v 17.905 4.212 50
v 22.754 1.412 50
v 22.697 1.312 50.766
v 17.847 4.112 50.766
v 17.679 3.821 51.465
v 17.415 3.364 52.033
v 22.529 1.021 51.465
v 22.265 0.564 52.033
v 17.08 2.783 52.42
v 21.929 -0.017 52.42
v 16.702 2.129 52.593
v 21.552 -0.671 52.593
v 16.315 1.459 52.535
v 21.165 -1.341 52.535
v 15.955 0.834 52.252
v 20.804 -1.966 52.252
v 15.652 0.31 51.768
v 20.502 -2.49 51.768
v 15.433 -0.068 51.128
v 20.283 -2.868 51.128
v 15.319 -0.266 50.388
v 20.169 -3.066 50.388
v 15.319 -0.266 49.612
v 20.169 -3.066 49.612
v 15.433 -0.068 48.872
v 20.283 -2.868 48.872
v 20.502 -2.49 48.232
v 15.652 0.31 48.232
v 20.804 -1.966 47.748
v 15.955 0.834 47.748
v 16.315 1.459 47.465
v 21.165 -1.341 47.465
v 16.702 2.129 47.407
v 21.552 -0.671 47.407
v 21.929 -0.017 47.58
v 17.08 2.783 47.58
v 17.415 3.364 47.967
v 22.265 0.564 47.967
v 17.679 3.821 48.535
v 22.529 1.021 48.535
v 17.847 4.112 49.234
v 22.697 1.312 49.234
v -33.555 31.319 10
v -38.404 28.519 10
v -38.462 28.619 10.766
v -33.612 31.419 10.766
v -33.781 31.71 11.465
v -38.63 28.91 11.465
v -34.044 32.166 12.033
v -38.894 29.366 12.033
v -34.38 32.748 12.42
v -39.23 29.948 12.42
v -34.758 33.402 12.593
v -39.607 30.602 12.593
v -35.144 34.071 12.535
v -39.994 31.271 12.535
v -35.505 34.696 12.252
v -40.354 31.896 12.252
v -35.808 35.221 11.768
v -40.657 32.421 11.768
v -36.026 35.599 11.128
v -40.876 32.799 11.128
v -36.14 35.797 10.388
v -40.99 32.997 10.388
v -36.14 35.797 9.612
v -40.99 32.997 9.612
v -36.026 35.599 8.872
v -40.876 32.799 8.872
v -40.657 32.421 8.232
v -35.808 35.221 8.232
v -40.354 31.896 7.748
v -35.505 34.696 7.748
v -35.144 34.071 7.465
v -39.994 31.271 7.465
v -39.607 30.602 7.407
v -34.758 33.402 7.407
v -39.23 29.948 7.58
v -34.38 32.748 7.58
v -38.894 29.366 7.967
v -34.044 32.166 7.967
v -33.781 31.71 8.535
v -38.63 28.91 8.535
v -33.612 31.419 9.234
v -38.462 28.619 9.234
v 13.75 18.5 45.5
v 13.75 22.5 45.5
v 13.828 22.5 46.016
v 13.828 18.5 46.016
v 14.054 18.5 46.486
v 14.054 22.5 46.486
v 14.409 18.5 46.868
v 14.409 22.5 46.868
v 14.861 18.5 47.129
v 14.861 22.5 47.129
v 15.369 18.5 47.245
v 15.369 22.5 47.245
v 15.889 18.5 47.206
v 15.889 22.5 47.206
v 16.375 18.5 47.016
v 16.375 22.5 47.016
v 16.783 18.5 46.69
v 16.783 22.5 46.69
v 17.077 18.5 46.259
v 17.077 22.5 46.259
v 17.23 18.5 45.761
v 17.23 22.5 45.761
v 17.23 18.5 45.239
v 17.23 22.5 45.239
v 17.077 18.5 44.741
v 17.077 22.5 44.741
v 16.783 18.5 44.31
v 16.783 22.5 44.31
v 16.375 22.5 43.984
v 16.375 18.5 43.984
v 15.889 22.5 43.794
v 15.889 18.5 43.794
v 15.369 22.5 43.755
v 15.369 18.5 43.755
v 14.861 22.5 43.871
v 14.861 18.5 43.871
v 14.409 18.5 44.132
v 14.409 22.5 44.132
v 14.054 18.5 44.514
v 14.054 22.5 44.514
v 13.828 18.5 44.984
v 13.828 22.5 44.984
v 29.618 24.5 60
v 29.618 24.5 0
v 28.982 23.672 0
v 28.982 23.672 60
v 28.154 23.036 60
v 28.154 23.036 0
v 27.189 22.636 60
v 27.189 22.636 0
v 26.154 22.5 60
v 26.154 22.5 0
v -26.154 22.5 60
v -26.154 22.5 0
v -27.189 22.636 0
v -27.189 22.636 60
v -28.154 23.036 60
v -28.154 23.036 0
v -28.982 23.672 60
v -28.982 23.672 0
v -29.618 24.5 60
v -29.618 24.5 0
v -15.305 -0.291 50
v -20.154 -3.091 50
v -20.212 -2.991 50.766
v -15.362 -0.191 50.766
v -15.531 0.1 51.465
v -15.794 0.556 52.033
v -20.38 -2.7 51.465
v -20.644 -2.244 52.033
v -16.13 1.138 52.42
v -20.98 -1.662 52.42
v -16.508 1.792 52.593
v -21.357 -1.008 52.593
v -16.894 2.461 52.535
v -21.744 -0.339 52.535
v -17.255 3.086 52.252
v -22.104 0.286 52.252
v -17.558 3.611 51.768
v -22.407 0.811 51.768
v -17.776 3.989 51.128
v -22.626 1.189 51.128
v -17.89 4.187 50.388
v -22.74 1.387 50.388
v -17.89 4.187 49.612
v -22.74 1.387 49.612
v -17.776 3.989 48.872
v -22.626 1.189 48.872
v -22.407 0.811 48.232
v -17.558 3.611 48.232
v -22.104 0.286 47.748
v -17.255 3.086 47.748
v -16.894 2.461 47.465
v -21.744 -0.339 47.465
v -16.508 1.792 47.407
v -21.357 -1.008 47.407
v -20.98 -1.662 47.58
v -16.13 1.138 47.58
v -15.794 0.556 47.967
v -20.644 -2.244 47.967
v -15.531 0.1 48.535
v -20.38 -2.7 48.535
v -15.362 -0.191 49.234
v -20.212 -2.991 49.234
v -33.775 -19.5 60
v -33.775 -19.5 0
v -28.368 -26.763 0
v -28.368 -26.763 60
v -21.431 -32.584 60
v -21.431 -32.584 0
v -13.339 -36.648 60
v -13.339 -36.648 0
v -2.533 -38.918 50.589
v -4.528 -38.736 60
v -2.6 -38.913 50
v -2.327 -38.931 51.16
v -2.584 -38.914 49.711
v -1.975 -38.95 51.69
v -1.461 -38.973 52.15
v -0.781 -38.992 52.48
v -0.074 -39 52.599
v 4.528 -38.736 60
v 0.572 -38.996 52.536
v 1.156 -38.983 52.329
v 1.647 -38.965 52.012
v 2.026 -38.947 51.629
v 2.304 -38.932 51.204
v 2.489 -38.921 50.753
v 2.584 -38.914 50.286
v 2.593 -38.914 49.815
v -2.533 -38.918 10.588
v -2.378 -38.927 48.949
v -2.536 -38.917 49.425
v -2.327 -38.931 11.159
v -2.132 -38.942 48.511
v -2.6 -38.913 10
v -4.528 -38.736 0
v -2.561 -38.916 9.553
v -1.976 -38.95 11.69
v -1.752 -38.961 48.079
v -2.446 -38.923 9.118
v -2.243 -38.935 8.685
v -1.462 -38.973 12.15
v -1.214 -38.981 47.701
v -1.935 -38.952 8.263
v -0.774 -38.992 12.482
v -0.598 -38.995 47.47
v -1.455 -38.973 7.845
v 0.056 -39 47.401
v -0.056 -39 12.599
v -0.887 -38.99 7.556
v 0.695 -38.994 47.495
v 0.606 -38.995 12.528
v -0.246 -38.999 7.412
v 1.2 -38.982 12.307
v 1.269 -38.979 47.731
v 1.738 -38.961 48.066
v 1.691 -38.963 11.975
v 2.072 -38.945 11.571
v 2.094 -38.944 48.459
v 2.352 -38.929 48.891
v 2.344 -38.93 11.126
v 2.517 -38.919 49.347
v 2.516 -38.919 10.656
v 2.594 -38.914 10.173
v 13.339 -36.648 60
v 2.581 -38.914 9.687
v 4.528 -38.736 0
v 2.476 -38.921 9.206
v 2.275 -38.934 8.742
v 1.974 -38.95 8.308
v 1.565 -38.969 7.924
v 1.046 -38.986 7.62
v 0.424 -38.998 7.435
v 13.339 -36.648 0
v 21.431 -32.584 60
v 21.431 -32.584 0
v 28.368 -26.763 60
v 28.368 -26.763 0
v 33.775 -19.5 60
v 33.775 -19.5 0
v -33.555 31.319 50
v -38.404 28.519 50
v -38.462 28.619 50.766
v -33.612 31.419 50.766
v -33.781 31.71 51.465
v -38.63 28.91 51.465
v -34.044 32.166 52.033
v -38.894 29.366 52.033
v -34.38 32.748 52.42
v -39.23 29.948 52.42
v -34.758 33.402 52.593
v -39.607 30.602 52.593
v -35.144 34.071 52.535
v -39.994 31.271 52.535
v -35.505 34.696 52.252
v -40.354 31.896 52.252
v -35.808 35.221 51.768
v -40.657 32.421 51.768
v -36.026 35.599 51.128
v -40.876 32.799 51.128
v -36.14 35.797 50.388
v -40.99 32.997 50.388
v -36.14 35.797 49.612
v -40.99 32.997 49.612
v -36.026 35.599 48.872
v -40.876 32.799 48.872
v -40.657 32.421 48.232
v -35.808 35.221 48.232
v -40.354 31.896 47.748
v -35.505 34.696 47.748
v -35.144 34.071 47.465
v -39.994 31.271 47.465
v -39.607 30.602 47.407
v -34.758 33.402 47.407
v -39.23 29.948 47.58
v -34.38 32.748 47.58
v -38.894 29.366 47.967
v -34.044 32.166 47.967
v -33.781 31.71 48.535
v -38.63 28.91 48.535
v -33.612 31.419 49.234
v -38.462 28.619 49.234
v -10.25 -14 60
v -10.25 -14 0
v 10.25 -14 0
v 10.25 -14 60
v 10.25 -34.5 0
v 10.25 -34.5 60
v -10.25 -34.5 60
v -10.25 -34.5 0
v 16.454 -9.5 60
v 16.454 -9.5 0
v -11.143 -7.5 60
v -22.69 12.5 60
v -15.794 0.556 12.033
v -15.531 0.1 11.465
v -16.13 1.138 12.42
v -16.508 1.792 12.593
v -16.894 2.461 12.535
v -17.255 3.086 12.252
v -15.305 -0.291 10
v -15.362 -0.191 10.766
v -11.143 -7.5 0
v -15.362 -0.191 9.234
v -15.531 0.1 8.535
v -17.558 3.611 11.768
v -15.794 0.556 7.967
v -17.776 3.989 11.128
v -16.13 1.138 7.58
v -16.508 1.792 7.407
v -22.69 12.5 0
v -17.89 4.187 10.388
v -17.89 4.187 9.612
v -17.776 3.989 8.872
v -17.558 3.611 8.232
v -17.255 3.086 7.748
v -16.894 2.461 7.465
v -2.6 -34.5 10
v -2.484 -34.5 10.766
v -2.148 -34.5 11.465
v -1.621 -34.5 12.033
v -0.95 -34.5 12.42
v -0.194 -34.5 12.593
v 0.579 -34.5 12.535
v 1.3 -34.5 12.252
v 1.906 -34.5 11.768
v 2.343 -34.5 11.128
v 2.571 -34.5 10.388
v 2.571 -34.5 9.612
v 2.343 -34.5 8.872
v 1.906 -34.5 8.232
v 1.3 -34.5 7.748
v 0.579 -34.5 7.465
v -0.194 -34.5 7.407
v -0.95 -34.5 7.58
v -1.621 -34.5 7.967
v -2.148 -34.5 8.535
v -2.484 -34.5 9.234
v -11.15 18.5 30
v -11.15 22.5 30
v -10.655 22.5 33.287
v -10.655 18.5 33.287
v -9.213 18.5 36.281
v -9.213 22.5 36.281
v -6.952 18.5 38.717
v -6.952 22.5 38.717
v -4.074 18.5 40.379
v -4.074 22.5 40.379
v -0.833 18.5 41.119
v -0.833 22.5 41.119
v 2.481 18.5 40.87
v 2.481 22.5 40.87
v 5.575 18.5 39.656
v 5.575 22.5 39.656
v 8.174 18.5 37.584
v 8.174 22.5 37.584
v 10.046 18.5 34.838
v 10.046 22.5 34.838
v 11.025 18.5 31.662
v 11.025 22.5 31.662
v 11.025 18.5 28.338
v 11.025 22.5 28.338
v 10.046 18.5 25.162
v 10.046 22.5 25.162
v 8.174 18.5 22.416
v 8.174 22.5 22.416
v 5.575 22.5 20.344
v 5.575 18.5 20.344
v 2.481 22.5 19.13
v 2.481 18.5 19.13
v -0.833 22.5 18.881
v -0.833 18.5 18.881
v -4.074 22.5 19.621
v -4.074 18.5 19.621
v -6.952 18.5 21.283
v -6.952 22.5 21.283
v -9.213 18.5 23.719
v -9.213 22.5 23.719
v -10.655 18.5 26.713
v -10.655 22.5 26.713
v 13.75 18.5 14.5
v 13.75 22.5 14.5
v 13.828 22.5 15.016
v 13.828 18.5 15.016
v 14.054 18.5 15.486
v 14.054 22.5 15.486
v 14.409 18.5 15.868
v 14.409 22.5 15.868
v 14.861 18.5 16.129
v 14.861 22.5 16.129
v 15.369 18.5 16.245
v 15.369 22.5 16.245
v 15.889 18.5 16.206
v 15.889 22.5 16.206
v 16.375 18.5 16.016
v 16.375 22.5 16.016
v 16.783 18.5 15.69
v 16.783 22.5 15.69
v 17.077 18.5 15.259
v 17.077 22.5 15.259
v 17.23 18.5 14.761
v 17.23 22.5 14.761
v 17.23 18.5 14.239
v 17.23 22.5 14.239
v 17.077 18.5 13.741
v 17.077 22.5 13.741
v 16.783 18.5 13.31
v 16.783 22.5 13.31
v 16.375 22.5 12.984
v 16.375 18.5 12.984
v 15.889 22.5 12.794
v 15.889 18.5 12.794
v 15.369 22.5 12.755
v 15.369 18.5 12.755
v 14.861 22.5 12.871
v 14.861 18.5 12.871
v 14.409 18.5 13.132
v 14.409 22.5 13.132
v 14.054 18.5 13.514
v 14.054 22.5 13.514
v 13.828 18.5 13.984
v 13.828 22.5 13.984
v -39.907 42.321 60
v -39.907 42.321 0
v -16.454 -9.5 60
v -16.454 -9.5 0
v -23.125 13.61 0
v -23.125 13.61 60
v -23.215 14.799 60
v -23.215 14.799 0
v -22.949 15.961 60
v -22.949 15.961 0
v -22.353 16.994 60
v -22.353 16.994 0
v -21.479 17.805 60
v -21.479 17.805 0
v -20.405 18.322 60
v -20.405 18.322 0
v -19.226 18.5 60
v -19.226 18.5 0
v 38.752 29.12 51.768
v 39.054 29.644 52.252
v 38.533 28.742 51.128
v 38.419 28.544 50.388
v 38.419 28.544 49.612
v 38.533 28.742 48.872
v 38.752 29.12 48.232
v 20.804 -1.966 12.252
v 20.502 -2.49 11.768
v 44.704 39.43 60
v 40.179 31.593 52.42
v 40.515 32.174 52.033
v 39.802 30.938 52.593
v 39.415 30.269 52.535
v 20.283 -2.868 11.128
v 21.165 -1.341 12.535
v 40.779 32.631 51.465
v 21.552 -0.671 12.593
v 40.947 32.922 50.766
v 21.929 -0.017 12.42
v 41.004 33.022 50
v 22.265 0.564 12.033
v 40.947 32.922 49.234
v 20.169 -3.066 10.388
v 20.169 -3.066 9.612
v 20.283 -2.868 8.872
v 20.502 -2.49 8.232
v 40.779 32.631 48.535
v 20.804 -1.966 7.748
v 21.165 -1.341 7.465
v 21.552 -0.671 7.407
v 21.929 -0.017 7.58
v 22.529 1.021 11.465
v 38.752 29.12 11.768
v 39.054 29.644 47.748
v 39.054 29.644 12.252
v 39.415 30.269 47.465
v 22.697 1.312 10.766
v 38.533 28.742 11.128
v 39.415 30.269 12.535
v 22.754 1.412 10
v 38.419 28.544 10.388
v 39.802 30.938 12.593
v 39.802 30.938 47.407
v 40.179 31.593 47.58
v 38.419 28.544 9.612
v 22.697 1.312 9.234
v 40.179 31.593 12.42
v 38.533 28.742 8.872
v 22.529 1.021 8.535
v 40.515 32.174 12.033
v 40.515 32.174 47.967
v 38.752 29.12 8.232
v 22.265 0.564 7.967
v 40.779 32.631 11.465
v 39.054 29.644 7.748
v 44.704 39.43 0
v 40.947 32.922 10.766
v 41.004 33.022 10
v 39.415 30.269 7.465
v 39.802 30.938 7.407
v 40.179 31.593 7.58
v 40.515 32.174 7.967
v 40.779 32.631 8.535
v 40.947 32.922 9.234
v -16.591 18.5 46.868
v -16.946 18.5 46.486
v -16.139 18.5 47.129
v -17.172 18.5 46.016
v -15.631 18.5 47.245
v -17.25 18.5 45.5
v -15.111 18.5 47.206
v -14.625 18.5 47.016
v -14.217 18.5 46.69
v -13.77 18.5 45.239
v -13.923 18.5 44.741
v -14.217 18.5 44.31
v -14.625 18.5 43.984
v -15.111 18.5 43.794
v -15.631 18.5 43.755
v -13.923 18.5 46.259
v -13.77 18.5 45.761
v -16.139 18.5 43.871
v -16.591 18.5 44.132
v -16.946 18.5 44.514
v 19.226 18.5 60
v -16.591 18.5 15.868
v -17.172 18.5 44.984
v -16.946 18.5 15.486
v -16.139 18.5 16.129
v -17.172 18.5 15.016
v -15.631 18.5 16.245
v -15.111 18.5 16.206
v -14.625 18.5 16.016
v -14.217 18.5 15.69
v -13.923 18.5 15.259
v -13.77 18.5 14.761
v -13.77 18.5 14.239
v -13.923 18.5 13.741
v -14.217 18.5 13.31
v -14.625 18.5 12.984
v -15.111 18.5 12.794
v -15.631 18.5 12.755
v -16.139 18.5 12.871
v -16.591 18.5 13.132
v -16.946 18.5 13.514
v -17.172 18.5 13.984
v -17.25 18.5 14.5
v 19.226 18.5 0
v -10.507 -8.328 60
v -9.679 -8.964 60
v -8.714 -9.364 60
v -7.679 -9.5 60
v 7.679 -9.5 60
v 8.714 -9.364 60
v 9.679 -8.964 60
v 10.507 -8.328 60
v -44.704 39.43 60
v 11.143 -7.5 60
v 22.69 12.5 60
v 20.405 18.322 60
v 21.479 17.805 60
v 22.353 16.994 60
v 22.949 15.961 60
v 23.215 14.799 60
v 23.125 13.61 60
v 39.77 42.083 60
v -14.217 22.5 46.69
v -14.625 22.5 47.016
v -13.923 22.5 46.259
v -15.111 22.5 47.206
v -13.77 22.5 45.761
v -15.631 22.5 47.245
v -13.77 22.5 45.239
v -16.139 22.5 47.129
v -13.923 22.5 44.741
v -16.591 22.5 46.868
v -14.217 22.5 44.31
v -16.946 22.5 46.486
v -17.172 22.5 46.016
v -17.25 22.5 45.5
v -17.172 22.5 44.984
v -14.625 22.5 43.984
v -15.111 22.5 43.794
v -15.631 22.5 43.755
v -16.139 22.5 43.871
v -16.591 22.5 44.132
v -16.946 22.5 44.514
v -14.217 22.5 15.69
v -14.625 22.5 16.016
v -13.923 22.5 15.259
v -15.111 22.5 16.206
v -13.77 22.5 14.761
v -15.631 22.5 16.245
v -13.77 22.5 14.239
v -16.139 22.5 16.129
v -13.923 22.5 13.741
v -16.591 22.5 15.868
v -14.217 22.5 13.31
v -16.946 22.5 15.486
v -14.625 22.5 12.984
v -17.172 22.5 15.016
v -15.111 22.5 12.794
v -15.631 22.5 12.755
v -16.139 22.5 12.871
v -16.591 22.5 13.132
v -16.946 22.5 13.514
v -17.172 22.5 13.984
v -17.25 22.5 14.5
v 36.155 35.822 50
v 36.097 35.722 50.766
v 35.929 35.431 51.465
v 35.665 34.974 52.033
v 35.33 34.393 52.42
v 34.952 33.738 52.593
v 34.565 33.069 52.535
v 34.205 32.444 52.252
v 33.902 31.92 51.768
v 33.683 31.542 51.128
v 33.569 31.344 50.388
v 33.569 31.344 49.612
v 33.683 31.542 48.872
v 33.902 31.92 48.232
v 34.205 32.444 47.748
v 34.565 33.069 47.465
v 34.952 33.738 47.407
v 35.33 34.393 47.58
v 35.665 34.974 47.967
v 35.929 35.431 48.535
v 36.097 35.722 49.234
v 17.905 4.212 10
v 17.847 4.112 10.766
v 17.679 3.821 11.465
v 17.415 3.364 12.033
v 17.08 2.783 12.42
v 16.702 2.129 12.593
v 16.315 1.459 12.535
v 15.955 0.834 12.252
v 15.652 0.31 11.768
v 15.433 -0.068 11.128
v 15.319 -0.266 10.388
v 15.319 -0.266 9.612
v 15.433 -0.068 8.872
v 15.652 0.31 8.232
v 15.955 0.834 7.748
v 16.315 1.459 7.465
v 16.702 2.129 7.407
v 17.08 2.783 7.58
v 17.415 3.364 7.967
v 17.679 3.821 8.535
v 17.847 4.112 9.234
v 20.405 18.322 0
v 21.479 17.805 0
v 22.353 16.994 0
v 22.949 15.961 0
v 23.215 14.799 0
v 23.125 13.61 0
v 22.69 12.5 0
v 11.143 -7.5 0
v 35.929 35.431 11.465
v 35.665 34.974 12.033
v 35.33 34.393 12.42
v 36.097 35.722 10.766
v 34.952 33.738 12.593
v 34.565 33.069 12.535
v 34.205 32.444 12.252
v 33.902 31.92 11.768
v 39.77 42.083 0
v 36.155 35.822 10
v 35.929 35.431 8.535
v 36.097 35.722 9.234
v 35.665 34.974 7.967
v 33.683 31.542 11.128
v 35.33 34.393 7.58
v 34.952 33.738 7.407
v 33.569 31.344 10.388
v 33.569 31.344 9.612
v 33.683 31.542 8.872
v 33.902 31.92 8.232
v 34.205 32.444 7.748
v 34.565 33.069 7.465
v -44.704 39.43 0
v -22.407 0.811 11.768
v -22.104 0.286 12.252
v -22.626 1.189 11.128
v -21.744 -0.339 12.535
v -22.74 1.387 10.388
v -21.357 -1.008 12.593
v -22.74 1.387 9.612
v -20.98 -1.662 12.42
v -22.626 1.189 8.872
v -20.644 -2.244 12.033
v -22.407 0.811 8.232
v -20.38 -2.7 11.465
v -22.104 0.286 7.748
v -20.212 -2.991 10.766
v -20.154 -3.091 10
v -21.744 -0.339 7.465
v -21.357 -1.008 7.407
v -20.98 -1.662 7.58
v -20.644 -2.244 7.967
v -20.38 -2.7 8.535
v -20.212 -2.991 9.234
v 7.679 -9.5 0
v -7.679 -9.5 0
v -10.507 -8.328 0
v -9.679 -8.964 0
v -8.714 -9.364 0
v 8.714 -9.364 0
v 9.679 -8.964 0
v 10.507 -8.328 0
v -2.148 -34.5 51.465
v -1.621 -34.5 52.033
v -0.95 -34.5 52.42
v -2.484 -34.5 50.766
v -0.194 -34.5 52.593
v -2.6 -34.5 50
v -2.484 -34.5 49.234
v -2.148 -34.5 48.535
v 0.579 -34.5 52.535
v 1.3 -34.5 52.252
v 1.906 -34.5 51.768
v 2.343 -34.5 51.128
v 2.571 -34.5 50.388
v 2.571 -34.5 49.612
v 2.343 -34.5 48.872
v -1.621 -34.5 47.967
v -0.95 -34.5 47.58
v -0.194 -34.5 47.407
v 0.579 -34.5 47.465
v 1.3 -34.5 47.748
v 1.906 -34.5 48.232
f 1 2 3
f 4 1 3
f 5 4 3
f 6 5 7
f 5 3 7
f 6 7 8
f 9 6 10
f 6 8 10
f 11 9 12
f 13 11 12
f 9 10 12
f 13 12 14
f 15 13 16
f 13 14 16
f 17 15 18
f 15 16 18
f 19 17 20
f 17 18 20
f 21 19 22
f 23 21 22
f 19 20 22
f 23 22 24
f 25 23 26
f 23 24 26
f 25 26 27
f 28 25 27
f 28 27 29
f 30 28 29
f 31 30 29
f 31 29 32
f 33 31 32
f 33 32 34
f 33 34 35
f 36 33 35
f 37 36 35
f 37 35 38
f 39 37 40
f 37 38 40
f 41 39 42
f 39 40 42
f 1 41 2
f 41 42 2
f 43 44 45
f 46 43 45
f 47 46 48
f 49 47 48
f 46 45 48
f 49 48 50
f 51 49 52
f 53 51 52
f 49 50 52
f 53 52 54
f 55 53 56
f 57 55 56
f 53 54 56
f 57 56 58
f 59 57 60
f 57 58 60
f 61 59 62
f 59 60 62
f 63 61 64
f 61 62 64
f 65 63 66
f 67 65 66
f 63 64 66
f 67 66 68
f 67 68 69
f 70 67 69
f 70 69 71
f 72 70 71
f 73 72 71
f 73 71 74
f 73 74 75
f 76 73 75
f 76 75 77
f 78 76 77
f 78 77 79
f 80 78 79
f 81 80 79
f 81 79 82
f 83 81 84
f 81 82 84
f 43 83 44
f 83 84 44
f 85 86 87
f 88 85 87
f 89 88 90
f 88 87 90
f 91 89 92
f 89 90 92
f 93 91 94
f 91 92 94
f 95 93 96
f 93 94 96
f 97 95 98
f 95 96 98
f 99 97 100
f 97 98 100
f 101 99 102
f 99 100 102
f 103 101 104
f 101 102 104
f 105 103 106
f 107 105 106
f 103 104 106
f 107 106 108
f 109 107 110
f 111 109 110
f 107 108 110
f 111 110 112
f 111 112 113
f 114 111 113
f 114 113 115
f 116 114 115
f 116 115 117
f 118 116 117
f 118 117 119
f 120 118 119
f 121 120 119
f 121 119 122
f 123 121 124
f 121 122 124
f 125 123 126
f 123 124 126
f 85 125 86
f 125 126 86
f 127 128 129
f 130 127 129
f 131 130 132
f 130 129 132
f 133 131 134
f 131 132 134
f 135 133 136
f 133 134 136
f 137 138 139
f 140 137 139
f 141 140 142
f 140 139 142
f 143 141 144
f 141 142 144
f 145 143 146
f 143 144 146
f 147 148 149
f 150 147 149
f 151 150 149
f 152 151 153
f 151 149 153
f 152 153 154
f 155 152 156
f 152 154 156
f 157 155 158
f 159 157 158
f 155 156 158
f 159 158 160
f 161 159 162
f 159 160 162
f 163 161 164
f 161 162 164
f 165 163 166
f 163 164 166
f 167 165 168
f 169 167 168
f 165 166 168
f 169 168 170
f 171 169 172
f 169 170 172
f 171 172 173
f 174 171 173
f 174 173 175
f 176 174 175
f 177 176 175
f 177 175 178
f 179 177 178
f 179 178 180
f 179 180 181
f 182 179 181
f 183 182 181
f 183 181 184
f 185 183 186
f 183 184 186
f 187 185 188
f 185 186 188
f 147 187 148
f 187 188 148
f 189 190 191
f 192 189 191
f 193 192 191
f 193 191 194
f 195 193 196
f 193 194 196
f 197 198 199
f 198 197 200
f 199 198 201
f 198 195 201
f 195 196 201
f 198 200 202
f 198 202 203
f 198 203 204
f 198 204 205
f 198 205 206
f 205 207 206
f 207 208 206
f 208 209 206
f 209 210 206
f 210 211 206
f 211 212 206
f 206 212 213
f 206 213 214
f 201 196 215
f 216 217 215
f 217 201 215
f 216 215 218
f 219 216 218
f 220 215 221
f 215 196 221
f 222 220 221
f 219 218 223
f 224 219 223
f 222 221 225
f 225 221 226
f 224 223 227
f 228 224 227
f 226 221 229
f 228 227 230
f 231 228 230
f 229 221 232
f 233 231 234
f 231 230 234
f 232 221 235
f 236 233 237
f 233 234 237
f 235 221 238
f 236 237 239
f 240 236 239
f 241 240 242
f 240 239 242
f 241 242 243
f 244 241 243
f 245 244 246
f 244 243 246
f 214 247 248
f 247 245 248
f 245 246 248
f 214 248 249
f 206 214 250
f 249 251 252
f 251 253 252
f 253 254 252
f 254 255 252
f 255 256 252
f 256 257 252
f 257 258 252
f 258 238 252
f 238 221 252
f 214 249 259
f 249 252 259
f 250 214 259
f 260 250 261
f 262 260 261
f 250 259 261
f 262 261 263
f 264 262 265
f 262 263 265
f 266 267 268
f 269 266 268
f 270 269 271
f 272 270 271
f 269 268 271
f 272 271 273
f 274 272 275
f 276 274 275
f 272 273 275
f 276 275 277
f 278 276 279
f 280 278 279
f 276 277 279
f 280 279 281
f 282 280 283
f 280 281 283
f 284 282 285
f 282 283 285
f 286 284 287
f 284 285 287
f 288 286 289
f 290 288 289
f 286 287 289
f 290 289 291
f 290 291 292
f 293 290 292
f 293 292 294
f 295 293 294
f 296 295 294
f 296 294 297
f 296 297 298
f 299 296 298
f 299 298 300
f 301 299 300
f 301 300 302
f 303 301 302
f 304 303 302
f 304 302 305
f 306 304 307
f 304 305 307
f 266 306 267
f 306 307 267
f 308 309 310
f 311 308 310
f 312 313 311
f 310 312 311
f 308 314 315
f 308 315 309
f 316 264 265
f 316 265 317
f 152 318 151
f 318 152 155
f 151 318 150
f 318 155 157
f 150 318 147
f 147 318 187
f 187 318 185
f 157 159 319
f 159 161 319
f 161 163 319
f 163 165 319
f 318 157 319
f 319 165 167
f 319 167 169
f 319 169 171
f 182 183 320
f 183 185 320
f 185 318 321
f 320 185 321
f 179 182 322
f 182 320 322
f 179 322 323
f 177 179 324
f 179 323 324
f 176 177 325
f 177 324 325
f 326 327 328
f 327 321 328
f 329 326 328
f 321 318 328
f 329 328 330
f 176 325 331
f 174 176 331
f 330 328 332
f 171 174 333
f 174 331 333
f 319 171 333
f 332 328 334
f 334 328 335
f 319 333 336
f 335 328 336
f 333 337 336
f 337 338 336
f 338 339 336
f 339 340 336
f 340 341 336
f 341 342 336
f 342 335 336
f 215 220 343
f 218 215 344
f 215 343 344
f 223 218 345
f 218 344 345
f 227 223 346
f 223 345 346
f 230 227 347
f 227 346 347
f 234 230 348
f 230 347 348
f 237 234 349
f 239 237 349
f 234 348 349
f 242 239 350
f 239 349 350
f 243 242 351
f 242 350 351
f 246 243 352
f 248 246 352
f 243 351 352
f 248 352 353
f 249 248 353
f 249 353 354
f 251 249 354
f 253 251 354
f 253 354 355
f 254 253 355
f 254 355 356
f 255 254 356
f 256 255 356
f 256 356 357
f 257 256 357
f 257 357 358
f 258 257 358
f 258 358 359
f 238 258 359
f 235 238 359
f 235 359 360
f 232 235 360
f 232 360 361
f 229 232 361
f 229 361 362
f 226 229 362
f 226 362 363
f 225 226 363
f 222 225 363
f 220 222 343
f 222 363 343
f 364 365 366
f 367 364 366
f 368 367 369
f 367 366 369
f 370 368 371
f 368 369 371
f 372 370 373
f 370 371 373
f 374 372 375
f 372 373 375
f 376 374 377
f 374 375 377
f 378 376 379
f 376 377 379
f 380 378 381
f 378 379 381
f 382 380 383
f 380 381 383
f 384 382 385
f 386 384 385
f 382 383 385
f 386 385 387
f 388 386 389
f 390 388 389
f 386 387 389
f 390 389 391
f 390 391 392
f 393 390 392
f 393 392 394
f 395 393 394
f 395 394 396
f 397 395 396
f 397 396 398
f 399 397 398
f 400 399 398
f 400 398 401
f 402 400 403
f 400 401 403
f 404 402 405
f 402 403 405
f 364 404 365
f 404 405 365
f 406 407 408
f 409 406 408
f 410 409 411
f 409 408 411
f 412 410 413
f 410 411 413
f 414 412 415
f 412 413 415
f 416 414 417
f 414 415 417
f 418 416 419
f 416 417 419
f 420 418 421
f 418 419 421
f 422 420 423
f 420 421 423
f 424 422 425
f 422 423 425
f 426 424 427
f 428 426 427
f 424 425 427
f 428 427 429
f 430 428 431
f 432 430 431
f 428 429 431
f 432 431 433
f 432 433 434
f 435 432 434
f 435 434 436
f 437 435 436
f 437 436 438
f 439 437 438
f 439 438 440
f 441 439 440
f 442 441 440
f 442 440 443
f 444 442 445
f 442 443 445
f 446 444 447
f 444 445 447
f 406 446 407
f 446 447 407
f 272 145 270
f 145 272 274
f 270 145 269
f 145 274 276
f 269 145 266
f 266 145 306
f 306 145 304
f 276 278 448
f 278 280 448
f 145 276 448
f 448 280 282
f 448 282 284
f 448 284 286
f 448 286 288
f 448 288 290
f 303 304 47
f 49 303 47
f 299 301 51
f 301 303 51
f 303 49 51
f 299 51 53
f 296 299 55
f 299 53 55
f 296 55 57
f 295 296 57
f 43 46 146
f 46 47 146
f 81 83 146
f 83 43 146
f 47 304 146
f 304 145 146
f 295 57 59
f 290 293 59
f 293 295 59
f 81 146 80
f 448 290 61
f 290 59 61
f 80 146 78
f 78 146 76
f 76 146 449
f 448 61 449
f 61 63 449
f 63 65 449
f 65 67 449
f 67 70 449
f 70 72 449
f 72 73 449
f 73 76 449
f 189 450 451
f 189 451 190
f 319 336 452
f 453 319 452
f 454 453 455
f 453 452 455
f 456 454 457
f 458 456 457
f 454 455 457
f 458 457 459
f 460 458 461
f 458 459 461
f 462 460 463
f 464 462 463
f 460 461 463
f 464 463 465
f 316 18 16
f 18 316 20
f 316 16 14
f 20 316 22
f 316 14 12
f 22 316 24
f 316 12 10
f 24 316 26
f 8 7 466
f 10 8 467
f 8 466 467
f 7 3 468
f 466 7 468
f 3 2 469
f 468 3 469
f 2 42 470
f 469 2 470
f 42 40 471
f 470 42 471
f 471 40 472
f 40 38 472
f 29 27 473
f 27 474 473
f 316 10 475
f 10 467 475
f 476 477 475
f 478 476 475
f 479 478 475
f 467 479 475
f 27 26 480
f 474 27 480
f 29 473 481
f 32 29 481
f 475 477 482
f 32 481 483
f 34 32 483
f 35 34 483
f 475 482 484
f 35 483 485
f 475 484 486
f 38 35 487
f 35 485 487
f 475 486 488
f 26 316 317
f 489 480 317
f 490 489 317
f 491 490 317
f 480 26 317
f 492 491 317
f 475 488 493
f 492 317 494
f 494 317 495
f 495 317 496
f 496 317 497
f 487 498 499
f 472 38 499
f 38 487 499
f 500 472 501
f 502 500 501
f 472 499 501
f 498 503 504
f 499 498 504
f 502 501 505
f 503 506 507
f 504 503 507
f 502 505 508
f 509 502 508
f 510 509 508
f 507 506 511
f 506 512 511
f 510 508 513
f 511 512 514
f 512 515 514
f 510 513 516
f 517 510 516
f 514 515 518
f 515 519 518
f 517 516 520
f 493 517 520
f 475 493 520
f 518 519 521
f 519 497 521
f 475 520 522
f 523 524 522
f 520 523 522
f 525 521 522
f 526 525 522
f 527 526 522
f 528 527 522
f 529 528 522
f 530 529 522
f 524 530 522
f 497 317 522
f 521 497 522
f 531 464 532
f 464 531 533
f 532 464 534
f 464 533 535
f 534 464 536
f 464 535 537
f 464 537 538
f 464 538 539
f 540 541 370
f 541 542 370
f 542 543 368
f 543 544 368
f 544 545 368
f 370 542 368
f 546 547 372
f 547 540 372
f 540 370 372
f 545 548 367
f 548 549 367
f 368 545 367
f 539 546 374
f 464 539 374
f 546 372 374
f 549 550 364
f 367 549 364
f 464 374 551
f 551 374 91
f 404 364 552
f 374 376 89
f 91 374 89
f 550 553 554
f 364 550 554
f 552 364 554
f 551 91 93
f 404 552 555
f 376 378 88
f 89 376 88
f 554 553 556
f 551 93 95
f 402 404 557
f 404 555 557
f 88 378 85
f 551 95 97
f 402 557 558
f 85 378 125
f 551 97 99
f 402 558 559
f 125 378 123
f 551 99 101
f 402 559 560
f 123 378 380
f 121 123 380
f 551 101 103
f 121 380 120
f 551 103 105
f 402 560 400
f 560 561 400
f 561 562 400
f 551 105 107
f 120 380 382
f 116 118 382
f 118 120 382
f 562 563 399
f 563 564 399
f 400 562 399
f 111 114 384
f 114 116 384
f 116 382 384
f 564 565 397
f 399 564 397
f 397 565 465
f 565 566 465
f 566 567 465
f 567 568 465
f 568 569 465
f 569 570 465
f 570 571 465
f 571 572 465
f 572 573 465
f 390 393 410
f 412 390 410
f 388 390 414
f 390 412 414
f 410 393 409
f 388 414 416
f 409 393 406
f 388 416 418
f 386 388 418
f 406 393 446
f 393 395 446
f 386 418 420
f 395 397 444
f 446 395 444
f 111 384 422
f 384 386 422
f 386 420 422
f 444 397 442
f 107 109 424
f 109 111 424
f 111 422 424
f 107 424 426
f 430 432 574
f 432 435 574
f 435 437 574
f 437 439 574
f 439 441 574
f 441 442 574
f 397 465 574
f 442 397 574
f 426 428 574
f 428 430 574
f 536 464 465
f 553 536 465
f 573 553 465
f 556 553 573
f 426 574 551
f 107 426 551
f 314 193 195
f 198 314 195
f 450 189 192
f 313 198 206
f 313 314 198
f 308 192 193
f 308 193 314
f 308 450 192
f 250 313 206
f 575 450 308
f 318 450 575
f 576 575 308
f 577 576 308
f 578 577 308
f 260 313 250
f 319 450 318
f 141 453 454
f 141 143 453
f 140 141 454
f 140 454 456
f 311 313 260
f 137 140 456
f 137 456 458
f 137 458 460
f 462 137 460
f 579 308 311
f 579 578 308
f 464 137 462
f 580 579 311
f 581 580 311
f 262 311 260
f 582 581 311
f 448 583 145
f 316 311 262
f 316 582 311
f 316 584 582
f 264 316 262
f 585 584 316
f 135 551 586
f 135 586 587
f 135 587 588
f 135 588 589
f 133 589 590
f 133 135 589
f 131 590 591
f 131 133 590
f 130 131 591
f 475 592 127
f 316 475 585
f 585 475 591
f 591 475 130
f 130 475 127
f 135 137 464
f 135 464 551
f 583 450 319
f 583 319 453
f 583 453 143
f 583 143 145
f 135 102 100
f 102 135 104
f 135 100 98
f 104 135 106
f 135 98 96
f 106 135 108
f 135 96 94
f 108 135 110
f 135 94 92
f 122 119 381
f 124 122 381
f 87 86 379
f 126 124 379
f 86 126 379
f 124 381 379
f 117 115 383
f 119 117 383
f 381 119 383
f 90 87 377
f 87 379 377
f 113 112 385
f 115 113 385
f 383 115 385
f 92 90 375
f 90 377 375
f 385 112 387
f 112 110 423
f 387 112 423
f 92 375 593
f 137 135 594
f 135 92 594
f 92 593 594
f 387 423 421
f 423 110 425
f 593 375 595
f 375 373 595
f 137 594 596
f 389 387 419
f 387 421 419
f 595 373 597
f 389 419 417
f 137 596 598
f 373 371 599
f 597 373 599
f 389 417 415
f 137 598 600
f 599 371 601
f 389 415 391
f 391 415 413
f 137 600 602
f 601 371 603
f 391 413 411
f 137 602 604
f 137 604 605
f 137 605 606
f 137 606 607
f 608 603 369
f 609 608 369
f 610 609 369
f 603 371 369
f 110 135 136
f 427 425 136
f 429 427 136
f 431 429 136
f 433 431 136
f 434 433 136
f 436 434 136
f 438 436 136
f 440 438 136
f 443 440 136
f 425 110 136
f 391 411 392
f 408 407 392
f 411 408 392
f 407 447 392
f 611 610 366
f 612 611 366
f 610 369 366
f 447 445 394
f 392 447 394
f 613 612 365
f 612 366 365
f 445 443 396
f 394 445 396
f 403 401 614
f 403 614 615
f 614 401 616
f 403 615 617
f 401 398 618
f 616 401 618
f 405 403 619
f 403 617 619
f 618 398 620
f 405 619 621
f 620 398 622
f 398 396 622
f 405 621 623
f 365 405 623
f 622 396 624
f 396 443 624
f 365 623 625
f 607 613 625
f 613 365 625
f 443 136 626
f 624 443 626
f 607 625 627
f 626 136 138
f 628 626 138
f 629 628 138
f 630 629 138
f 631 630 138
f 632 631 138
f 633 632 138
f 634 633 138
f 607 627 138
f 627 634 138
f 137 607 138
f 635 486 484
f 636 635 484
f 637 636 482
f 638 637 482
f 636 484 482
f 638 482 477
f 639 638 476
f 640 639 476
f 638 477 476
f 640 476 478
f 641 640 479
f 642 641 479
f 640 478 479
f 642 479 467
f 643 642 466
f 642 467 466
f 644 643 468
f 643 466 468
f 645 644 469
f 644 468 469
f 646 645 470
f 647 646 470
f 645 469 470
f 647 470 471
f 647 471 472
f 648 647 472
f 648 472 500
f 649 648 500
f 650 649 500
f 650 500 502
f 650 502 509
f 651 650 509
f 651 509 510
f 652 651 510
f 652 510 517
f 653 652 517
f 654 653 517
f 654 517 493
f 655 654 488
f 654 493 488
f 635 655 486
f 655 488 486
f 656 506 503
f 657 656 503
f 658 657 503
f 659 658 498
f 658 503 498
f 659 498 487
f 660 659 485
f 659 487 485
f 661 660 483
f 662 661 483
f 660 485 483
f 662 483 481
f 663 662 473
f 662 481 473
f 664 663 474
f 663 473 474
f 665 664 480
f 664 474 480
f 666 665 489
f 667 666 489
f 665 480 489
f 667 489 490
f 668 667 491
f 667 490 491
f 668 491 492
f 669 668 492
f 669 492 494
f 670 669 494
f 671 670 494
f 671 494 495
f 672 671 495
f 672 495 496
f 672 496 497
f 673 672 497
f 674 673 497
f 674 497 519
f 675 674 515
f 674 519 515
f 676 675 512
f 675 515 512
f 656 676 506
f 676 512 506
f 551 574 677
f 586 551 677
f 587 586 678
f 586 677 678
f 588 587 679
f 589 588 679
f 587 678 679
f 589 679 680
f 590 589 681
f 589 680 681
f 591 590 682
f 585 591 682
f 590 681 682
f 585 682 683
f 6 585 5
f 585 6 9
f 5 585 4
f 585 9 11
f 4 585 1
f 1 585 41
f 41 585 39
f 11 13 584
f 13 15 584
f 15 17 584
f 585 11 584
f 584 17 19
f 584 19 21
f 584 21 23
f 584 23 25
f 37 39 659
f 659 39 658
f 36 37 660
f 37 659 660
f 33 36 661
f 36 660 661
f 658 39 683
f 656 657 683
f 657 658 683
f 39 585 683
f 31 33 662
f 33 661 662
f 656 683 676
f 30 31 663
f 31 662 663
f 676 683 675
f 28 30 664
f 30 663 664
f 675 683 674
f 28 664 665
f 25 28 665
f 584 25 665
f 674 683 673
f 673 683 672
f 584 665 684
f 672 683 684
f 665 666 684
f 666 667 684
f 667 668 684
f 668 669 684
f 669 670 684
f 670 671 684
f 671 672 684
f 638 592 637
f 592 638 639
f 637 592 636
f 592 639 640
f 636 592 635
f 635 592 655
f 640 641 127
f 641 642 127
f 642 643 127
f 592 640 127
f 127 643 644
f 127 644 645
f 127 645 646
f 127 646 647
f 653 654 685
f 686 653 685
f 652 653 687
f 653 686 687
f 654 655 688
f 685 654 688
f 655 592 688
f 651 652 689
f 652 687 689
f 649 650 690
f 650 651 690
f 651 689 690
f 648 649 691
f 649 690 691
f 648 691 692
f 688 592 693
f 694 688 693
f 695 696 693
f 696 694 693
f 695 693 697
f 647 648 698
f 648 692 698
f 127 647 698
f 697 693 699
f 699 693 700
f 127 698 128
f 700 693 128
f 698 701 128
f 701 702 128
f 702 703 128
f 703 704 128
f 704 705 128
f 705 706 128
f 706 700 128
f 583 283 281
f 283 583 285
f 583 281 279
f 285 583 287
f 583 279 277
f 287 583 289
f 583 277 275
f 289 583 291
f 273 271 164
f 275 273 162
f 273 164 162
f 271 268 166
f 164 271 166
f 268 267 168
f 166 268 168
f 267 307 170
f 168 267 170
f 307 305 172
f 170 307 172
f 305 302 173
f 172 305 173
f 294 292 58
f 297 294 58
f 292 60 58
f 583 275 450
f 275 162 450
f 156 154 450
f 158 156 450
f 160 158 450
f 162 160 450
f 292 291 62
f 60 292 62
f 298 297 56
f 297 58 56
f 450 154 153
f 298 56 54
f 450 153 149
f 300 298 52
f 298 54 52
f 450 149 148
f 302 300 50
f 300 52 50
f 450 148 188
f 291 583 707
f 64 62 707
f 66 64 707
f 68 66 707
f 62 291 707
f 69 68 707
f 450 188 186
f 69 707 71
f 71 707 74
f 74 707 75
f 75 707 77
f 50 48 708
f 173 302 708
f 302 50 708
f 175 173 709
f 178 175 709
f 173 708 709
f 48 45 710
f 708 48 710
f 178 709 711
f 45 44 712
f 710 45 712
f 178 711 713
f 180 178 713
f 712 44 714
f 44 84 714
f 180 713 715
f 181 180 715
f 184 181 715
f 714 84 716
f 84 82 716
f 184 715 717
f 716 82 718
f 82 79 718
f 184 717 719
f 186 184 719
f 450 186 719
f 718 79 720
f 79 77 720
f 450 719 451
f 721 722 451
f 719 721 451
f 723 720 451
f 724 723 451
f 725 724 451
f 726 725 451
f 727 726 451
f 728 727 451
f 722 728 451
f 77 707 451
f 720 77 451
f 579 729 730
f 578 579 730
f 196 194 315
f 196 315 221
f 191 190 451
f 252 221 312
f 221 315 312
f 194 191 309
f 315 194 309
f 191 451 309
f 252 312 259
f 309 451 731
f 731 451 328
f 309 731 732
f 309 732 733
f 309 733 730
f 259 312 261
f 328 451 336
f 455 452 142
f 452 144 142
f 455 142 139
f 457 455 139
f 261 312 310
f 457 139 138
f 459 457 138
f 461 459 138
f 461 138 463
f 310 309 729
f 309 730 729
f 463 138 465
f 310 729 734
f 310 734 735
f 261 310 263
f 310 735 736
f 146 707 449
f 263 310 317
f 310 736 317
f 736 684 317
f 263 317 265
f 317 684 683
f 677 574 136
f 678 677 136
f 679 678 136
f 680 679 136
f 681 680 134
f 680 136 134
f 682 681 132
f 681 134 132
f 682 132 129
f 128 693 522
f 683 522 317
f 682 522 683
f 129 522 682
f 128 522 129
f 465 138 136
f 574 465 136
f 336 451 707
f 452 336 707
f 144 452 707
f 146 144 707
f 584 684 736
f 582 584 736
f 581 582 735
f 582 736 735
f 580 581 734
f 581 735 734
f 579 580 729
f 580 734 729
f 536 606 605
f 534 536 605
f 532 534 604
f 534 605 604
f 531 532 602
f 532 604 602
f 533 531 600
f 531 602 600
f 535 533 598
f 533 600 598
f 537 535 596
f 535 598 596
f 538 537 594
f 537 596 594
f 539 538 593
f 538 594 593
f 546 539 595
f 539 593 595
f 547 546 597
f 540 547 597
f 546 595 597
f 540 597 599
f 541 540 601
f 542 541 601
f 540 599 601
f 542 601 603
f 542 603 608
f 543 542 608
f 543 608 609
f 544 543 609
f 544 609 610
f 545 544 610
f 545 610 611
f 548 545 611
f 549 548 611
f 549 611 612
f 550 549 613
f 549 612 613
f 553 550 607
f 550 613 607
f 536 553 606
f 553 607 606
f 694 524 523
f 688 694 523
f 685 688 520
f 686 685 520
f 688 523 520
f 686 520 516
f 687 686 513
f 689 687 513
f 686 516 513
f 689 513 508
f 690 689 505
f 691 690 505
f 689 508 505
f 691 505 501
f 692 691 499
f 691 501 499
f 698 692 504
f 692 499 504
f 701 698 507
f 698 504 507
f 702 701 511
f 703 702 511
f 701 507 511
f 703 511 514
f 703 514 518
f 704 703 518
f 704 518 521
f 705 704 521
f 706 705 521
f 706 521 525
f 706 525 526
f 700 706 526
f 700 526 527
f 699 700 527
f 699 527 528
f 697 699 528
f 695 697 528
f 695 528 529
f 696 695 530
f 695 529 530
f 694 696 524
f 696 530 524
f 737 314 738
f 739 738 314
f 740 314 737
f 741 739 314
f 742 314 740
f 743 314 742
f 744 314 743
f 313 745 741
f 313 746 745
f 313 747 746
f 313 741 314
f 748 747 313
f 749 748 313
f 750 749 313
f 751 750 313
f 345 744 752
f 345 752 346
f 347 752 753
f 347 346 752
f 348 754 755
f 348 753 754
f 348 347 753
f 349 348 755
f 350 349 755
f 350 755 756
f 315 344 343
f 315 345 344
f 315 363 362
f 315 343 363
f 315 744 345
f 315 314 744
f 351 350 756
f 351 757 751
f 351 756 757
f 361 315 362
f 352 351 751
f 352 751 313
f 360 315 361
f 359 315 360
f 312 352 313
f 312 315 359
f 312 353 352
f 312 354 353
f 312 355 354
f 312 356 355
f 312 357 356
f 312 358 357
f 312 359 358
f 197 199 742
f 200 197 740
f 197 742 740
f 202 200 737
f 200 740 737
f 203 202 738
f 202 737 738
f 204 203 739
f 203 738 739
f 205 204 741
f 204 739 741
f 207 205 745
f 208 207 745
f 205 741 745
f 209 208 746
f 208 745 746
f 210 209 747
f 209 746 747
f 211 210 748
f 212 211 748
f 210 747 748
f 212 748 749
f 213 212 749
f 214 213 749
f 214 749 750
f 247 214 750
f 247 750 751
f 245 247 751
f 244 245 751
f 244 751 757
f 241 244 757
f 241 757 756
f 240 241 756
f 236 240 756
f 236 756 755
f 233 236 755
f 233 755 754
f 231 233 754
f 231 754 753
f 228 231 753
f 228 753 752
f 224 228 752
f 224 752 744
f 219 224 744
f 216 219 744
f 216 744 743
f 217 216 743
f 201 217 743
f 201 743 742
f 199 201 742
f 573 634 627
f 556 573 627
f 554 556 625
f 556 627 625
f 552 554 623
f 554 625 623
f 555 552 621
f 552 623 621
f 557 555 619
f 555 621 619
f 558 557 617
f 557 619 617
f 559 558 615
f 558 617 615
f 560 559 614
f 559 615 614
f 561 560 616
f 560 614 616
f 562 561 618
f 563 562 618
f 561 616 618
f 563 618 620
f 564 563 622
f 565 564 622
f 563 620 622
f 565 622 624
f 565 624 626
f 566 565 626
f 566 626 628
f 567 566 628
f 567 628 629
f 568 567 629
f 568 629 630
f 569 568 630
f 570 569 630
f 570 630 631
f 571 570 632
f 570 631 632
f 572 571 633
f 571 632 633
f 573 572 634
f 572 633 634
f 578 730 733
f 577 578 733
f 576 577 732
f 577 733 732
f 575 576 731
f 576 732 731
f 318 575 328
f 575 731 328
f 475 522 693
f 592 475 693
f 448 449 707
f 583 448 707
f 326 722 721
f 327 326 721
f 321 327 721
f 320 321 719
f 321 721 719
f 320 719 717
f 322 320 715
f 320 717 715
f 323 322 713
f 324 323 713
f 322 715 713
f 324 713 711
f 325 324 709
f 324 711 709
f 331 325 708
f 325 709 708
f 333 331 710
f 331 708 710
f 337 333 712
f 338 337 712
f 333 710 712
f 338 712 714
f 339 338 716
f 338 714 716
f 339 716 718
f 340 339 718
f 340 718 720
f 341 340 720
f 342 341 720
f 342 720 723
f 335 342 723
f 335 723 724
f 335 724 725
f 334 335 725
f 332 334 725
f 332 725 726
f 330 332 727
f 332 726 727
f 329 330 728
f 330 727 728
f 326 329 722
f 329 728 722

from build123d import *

# Parameters (mm, degrees)
F0_W     = 20.5
F0_H     = 20.5
F1_DEPTH = 60
F2_R     = 1.75
F2_R_2   = 11.15
F3_DEPTH = 4
F4_R     = 2.6
F5_DEPTH = 5.6
F6_R     = 2.6
F7_DEPTH = 5.6
F8_R     = 2.6
F9_DEPTH = 4.501


with BuildPart() as f1:
    # F0 (on Top) → F1 (new body)
    with BuildSketch(Plane.XY):
        with BuildLine():
            Line((-16.4544826719, -9.5), (-33.7749907476, -19.5))
            ThreePointArc((-33.7749907476, -19.5), (0, -39), (33.7749907476, -19.5))
            Line((33.7749907476, -19.5), (16.4544826719, -9.5))
            Line((16.4544826719, -9.5), (44.7044826719, 39.4304353138))
            Line((44.7044826719, 39.4304353138), (39.7695460128, 42.0828742882))
            Line((39.7695460128, 42.0828742882), (29.6180688094, 24.5))
            ThreePointArc((29.6180688094, 24.5), (28.1539671943, 23.0358983849), (26.1539671943, 22.5))
            Line((26.1539671943, 22.5), (-26.1539671943, 22.5))
            ThreePointArc((-26.1539671943, 22.5), (-28.1539671943, 23.0358983849), (-29.6180688094, 24.5))
            Line((-29.6180688094, 24.5), (-39.9072594683, 42.3214009899))
            Line((-39.9072594683, 42.3214009899), (-44.7044826719, 39.4304353138))
            Line((-44.7044826719, 39.4304353138), (-16.4544826719, -9.5))
        make_face()
        with Locations((0, -24.25)):
            Rectangle(F0_W, F0_H, mode=Mode.SUBTRACT)
        with BuildLine():
            Line((-11.1428601954, -7.5), (-22.6898655792, 12.5))
            ThreePointArc((-22.6898655792, 12.5), (-22.6898655792, 16.5), (-19.225763964, 18.5))
            Line((-19.225763964, 18.5), (19.225763964, 18.5))
            ThreePointArc((19.225763964, 18.5), (22.6898655792, 16.5), (22.6898655792, 12.5))
            Line((22.6898655792, 12.5), (11.1428601954, -7.5))
            ThreePointArc((11.1428601954, -7.5), (9.6787585802, -8.9641016151), (7.6787585802, -9.5))
            Line((7.6787585802, -9.5), (-7.6787585802, -9.5))
            ThreePointArc((-7.6787585802, -9.5), (-9.6787585802, -8.9641016151), (-11.1428601954, -7.5))
        make_face(mode=Mode.SUBTRACT)
    extrude(amount=F1_DEPTH)

    # F2 (on face) → F3 (cut)
    with BuildSketch(Plane(origin=(0, 22.5, 0), x_dir=(-1, 0, 0), z_dir=(0, 1, 0))):
        with Locations((-15.5, 14.5)):
            Circle(F2_R)
        with Locations((-15.5, 45.5)):
            Circle(F2_R)
        with Locations((15.5, 45.5)):
            Circle(F2_R)
        with Locations((15.5, 14.5)):
            Circle(F2_R)
        with Locations((0, 30)):
            Circle(F2_R_2)
    extrude(amount=-F3_DEPTH, mode=Mode.SUBTRACT)

    # F4 (on face) → F5 (cut)
    with BuildSketch(Plane(origin=(-16.4544826719, -9.5, 0), x_dir=(0.5, -0.8660254038, 0), z_dir=(-0.8660254038, -0.5, 0))):
        with Locations((-46.5, 50)):
            Circle(F4_R)
        with Locations((-10, 50)):
            Circle(F4_R)
        with Locations((-10, 10)):
            Circle(F4_R)
        with Locations((-46.5, 10)):
            Circle(F4_R)
    extrude(amount=-F5_DEPTH, mode=Mode.SUBTRACT)

    # F6 (on face) → F7 (cut)
    with BuildSketch(Plane(origin=(16.4544826719, -9.5, 0), x_dir=(0.5, 0.8660254038, 0), z_dir=(0.8660254038, -0.5, 0))):
        with Locations((46.5, 50)):
            Circle(F6_R)
        with Locations((46.5, 10)):
            Circle(F6_R)
        with Locations((10, 10)):
            Circle(F6_R)
        with Locations((10, 50)):
            Circle(F6_R)
    extrude(amount=-F7_DEPTH, mode=Mode.SUBTRACT)

    # F8 (on face) → F9 (cut, through all)
    with BuildSketch(Plane(origin=(0, -34.5, 0), x_dir=(-1, 0, 0), z_dir=(0, 1, 0))):
        with Locations((0, 50)):
            Circle(F8_R)
        with Locations((0, 10)):
            Circle(F8_R)
    extrude(amount=-F9_DEPTH, mode=Mode.SUBTRACT)


solid = f1.part
